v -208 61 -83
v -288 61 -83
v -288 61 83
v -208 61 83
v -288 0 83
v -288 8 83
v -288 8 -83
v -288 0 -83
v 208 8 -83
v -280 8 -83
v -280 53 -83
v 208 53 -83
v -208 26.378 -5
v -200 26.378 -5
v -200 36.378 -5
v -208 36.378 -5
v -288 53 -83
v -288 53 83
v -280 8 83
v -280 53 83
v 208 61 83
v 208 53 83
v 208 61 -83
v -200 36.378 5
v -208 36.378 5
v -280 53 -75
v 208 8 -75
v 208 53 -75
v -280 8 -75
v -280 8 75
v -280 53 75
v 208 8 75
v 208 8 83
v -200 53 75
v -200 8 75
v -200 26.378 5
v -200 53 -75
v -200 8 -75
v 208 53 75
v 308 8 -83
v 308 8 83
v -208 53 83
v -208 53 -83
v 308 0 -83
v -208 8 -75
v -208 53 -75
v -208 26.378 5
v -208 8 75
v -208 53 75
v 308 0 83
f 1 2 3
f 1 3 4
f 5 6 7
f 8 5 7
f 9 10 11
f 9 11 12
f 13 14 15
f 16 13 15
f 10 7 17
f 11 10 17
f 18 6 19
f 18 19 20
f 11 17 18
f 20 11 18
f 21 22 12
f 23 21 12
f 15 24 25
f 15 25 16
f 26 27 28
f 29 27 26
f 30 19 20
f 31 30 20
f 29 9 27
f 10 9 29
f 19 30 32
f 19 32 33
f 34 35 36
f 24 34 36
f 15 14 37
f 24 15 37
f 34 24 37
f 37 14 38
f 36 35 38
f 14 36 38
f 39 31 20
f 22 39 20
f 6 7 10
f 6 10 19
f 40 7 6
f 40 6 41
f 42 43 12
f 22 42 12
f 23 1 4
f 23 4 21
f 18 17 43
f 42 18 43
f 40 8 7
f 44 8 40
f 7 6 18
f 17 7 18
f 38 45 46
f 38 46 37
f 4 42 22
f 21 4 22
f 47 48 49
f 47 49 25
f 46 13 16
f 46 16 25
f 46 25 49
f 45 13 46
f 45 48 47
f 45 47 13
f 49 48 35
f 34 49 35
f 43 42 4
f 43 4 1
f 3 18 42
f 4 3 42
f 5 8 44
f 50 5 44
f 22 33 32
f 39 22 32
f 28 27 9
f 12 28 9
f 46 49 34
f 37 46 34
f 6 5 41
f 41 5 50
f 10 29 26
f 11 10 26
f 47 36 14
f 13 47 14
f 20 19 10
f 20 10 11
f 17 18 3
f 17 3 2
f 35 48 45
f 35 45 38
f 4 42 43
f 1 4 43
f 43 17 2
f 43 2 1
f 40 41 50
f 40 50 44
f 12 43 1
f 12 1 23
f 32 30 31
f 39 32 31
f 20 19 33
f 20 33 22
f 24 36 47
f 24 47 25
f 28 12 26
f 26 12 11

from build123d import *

# Parameters (mm, degrees)
SKETCH2_W             = 416
SKETCH2_H             = 166
BOSS_EXTRUDE1_DEPTH   = 8
SKETCH6_W             = 80
SKETCH6_H             = 166
BOSS_EXTRUDE5_DEPTH   = 8
SKETCH3_W             = 416
SKETCH3_H             = 8
BOSS_EXTRUDE2_DEPTH   = 45
BOSS_EXTRUDE2_2_DEPTH = 45
SKETCH4_W             = 8
SKETCH4_H             = 150
BOSS_EXTRUDE3_DEPTH   = 45
SKETCH7_W             = 166
SKETCH7_H             = 8
BOSS_EXTRUDE7_DEPTH   = 100
BOSS_EXTRUDE8_DEPTH   = 45
SPLIT2_START          = -288
SPLIT2_OUTLINE_W      = 45
SPLIT2_OUTLINE_H      = 166
SPLIT2_DEPTH          = 8
SPLIT2_2_OUTLINE_W    = 45
SPLIT2_2_OUTLINE_H    = 166
SPLIT2_2_DEPTH        = 8
SPLIT2_START_2        = -280
SPLIT2_3_OUTLINE_W    = 45
SPLIT2_3_OUTLINE_H    = 8
SPLIT2_3_DEPTH        = 72
SPLIT2_4_OUTLINE_W    = 45
SPLIT2_4_OUTLINE_H    = 8
SPLIT2_4_DEPTH        = 72
SKETCH9_W             = 80
SKETCH9_H             = 166
BOSS_EXTRUDE9_DEPTH   = 8
SKETCH11_W            = 416
SKETCH11_H            = 166
BOSS_EXTRUDE10_DEPTH  = 8
SKETCH12_W            = 10
SKETCH12_H            = 10
CUT_EXTRUDE1_DEPTH    = 8


with BuildPart() as part:
    # Sketch2 → Boss-Extrude1 (new body)
    with BuildSketch(Plane(origin=(0, 0, 0), x_dir=(1, 0, 0), z_dir=(0, 1, 0))):
        Rectangle(SKETCH2_W, SKETCH2_H)
    extrude(amount=BOSS_EXTRUDE1_DEPTH)


with BuildPart() as body_2:
    # Sketch6 → Boss-Extrude5 (new body)
    with BuildSketch(Plane(origin=(0, 8, 0), x_dir=(1, 0, 0), z_dir=(0, 1, 0))):
        with Locations((-248, 0)):
            Rectangle(SKETCH6_W, SKETCH6_H)
    extrude(amount=-BOSS_EXTRUDE5_DEPTH)


with BuildPart() as body_3:
    # Sketch3 → Boss-Extrude2 (new body)
    with BuildSketch(Plane(origin=(0, 8, 0), x_dir=(1, 0, 0), z_dir=(0, 1, 0))):
        with Locations((0, 79)):
            Rectangle(SKETCH3_W, SKETCH3_H)
    extrude(amount=BOSS_EXTRUDE2_DEPTH)


with BuildPart() as body_4:
    # Sketch3 → Boss-Extrude2 2 (new body)
    with BuildSketch(Plane(origin=(0, 8, 0), x_dir=(1, 0, 0), z_dir=(0, 1, 0))):
        with Locations((0, -79)):
            Rectangle(SKETCH3_W, SKETCH3_H)
    extrude(amount=BOSS_EXTRUDE2_2_DEPTH)


with BuildPart() as body_5:
    # Sketch4 → Boss-Extrude3 (new body)
    with BuildSketch(Plane(origin=(0, 8, 0), x_dir=(1, 0, 0), z_dir=(0, 1, 0))):
        with Locations((-204, 0)):
            Rectangle(SKETCH4_W, SKETCH4_H)
    extrude(amount=BOSS_EXTRUDE3_DEPTH)

    # Sketch12 → Cut-Extrude1 (cut)
    with BuildSketch(Plane(origin=(-200, 0, 0), x_dir=(0, 0, -1), z_dir=(1, 0, 0))):
        with Locations((0, 31.378353454)):
            Rectangle(SKETCH12_W, SKETCH12_H)
    extrude(amount=-CUT_EXTRUDE1_DEPTH, mode=Mode.SUBTRACT)


with BuildPart() as body_6:
    # Sketch7 → Boss-Extrude7 (new body)
    with BuildSketch(Plane(origin=(208, 0, 0), x_dir=(0, 0, -1), z_dir=(1, 0, 0))):
        with Locations((0, 4)):
            Rectangle(SKETCH7_W, SKETCH7_H)
    extrude(amount=BOSS_EXTRUDE7_DEPTH)

    # Combine1: union part
    add(part.part)


with BuildPart() as body_2_1:
    add(body_2.part)

    # Combine2: union body 6
    add(body_6.part)


with BuildPart() as body_5_2:
    # Sketch8 → Boss-Extrude8 (new body)
    with BuildSketch(Plane(origin=(0, 8, 0), x_dir=(1, 0, 0), z_dir=(0, 1, 0))):
        Polygon((-288, 83), (-208, 83), (-208, 75), (-280, 75), (-280, -75), (-208, -75), (-208, -83), (-288, -83), (-288, -75), (-288, 75), align=None)
    extrude(amount=BOSS_EXTRUDE8_DEPTH)

    # Split2 2 outline → Split2 2 (cut)
    with BuildSketch(Plane.YZ.offset(SPLIT2_START)):
        with Locations((30.5, 0)):
            Rectangle(SPLIT2_2_OUTLINE_W, SPLIT2_2_OUTLINE_H)
    extrude(amount=SPLIT2_2_DEPTH, mode=Mode.SUBTRACT)

    # Split2 3 outline → Split2 3 (cut)
    with BuildSketch(Plane.YZ.offset(SPLIT2_START_2)):
        with Locations((30.5, 79)):
            Rectangle(SPLIT2_3_OUTLINE_W, SPLIT2_3_OUTLINE_H)
    extrude(amount=SPLIT2_3_DEPTH, mode=Mode.SUBTRACT)


with BuildPart() as body_6_2:
    # Split2: read off the stored shape, not the designer's step
    # Split2 outline → Split2 (new body)
    with BuildSketch(Plane.YZ.offset(SPLIT2_START)):
        with Locations((30.5, 0)):
            Rectangle(SPLIT2_OUTLINE_W, SPLIT2_OUTLINE_H)
    extrude(amount=SPLIT2_DEPTH)


with BuildPart() as body_7:
    # Split2 4 outline → Split2 4 (new body)
    with BuildSketch(Plane.YZ.offset(SPLIT2_START_2)):
        with Locations((30.5, 79)):
            Rectangle(SPLIT2_4_OUTLINE_W, SPLIT2_4_OUTLINE_H)
    extrude(amount=SPLIT2_4_DEPTH)


with BuildPart() as body_4_1:
    add(body_4.part)

    # Combine3: read off the stored shape, not the designer's step
    # Combine3: union body 7
    add(body_7.part)


with BuildPart() as body_3_1:
    add(body_3.part)

    # Combine4: read off the stored shape, not the designer's step
    # Combine4: union body 5 2
    add(body_5_2.part)


with BuildPart() as body_6_3:
    # Sketch9 → Boss-Extrude9 (new body)
    with BuildSketch(Plane(origin=(0, 53, 0), x_dir=(1, 0, 0), z_dir=(0, 1, 0))):
        with Locations((-248, 0)):
            Rectangle(SKETCH9_W, SKETCH9_H)
    extrude(amount=BOSS_EXTRUDE9_DEPTH)


with BuildPart() as body_7_2:
    # Sketch11 → Boss-Extrude10 (new body)
    with BuildSketch(Plane(origin=(0, 53, 0), x_dir=(1, 0, 0), z_dir=(0, 1, 0))):
        Rectangle(SKETCH11_W, SKETCH11_H)
    extrude(amount=BOSS_EXTRUDE10_DEPTH)


solid = Compound([body_5.part, body_2_1.part, body_6_2.part, body_4_1.part, body_3_1.part, body_6_3.part, body_7_2.part])
